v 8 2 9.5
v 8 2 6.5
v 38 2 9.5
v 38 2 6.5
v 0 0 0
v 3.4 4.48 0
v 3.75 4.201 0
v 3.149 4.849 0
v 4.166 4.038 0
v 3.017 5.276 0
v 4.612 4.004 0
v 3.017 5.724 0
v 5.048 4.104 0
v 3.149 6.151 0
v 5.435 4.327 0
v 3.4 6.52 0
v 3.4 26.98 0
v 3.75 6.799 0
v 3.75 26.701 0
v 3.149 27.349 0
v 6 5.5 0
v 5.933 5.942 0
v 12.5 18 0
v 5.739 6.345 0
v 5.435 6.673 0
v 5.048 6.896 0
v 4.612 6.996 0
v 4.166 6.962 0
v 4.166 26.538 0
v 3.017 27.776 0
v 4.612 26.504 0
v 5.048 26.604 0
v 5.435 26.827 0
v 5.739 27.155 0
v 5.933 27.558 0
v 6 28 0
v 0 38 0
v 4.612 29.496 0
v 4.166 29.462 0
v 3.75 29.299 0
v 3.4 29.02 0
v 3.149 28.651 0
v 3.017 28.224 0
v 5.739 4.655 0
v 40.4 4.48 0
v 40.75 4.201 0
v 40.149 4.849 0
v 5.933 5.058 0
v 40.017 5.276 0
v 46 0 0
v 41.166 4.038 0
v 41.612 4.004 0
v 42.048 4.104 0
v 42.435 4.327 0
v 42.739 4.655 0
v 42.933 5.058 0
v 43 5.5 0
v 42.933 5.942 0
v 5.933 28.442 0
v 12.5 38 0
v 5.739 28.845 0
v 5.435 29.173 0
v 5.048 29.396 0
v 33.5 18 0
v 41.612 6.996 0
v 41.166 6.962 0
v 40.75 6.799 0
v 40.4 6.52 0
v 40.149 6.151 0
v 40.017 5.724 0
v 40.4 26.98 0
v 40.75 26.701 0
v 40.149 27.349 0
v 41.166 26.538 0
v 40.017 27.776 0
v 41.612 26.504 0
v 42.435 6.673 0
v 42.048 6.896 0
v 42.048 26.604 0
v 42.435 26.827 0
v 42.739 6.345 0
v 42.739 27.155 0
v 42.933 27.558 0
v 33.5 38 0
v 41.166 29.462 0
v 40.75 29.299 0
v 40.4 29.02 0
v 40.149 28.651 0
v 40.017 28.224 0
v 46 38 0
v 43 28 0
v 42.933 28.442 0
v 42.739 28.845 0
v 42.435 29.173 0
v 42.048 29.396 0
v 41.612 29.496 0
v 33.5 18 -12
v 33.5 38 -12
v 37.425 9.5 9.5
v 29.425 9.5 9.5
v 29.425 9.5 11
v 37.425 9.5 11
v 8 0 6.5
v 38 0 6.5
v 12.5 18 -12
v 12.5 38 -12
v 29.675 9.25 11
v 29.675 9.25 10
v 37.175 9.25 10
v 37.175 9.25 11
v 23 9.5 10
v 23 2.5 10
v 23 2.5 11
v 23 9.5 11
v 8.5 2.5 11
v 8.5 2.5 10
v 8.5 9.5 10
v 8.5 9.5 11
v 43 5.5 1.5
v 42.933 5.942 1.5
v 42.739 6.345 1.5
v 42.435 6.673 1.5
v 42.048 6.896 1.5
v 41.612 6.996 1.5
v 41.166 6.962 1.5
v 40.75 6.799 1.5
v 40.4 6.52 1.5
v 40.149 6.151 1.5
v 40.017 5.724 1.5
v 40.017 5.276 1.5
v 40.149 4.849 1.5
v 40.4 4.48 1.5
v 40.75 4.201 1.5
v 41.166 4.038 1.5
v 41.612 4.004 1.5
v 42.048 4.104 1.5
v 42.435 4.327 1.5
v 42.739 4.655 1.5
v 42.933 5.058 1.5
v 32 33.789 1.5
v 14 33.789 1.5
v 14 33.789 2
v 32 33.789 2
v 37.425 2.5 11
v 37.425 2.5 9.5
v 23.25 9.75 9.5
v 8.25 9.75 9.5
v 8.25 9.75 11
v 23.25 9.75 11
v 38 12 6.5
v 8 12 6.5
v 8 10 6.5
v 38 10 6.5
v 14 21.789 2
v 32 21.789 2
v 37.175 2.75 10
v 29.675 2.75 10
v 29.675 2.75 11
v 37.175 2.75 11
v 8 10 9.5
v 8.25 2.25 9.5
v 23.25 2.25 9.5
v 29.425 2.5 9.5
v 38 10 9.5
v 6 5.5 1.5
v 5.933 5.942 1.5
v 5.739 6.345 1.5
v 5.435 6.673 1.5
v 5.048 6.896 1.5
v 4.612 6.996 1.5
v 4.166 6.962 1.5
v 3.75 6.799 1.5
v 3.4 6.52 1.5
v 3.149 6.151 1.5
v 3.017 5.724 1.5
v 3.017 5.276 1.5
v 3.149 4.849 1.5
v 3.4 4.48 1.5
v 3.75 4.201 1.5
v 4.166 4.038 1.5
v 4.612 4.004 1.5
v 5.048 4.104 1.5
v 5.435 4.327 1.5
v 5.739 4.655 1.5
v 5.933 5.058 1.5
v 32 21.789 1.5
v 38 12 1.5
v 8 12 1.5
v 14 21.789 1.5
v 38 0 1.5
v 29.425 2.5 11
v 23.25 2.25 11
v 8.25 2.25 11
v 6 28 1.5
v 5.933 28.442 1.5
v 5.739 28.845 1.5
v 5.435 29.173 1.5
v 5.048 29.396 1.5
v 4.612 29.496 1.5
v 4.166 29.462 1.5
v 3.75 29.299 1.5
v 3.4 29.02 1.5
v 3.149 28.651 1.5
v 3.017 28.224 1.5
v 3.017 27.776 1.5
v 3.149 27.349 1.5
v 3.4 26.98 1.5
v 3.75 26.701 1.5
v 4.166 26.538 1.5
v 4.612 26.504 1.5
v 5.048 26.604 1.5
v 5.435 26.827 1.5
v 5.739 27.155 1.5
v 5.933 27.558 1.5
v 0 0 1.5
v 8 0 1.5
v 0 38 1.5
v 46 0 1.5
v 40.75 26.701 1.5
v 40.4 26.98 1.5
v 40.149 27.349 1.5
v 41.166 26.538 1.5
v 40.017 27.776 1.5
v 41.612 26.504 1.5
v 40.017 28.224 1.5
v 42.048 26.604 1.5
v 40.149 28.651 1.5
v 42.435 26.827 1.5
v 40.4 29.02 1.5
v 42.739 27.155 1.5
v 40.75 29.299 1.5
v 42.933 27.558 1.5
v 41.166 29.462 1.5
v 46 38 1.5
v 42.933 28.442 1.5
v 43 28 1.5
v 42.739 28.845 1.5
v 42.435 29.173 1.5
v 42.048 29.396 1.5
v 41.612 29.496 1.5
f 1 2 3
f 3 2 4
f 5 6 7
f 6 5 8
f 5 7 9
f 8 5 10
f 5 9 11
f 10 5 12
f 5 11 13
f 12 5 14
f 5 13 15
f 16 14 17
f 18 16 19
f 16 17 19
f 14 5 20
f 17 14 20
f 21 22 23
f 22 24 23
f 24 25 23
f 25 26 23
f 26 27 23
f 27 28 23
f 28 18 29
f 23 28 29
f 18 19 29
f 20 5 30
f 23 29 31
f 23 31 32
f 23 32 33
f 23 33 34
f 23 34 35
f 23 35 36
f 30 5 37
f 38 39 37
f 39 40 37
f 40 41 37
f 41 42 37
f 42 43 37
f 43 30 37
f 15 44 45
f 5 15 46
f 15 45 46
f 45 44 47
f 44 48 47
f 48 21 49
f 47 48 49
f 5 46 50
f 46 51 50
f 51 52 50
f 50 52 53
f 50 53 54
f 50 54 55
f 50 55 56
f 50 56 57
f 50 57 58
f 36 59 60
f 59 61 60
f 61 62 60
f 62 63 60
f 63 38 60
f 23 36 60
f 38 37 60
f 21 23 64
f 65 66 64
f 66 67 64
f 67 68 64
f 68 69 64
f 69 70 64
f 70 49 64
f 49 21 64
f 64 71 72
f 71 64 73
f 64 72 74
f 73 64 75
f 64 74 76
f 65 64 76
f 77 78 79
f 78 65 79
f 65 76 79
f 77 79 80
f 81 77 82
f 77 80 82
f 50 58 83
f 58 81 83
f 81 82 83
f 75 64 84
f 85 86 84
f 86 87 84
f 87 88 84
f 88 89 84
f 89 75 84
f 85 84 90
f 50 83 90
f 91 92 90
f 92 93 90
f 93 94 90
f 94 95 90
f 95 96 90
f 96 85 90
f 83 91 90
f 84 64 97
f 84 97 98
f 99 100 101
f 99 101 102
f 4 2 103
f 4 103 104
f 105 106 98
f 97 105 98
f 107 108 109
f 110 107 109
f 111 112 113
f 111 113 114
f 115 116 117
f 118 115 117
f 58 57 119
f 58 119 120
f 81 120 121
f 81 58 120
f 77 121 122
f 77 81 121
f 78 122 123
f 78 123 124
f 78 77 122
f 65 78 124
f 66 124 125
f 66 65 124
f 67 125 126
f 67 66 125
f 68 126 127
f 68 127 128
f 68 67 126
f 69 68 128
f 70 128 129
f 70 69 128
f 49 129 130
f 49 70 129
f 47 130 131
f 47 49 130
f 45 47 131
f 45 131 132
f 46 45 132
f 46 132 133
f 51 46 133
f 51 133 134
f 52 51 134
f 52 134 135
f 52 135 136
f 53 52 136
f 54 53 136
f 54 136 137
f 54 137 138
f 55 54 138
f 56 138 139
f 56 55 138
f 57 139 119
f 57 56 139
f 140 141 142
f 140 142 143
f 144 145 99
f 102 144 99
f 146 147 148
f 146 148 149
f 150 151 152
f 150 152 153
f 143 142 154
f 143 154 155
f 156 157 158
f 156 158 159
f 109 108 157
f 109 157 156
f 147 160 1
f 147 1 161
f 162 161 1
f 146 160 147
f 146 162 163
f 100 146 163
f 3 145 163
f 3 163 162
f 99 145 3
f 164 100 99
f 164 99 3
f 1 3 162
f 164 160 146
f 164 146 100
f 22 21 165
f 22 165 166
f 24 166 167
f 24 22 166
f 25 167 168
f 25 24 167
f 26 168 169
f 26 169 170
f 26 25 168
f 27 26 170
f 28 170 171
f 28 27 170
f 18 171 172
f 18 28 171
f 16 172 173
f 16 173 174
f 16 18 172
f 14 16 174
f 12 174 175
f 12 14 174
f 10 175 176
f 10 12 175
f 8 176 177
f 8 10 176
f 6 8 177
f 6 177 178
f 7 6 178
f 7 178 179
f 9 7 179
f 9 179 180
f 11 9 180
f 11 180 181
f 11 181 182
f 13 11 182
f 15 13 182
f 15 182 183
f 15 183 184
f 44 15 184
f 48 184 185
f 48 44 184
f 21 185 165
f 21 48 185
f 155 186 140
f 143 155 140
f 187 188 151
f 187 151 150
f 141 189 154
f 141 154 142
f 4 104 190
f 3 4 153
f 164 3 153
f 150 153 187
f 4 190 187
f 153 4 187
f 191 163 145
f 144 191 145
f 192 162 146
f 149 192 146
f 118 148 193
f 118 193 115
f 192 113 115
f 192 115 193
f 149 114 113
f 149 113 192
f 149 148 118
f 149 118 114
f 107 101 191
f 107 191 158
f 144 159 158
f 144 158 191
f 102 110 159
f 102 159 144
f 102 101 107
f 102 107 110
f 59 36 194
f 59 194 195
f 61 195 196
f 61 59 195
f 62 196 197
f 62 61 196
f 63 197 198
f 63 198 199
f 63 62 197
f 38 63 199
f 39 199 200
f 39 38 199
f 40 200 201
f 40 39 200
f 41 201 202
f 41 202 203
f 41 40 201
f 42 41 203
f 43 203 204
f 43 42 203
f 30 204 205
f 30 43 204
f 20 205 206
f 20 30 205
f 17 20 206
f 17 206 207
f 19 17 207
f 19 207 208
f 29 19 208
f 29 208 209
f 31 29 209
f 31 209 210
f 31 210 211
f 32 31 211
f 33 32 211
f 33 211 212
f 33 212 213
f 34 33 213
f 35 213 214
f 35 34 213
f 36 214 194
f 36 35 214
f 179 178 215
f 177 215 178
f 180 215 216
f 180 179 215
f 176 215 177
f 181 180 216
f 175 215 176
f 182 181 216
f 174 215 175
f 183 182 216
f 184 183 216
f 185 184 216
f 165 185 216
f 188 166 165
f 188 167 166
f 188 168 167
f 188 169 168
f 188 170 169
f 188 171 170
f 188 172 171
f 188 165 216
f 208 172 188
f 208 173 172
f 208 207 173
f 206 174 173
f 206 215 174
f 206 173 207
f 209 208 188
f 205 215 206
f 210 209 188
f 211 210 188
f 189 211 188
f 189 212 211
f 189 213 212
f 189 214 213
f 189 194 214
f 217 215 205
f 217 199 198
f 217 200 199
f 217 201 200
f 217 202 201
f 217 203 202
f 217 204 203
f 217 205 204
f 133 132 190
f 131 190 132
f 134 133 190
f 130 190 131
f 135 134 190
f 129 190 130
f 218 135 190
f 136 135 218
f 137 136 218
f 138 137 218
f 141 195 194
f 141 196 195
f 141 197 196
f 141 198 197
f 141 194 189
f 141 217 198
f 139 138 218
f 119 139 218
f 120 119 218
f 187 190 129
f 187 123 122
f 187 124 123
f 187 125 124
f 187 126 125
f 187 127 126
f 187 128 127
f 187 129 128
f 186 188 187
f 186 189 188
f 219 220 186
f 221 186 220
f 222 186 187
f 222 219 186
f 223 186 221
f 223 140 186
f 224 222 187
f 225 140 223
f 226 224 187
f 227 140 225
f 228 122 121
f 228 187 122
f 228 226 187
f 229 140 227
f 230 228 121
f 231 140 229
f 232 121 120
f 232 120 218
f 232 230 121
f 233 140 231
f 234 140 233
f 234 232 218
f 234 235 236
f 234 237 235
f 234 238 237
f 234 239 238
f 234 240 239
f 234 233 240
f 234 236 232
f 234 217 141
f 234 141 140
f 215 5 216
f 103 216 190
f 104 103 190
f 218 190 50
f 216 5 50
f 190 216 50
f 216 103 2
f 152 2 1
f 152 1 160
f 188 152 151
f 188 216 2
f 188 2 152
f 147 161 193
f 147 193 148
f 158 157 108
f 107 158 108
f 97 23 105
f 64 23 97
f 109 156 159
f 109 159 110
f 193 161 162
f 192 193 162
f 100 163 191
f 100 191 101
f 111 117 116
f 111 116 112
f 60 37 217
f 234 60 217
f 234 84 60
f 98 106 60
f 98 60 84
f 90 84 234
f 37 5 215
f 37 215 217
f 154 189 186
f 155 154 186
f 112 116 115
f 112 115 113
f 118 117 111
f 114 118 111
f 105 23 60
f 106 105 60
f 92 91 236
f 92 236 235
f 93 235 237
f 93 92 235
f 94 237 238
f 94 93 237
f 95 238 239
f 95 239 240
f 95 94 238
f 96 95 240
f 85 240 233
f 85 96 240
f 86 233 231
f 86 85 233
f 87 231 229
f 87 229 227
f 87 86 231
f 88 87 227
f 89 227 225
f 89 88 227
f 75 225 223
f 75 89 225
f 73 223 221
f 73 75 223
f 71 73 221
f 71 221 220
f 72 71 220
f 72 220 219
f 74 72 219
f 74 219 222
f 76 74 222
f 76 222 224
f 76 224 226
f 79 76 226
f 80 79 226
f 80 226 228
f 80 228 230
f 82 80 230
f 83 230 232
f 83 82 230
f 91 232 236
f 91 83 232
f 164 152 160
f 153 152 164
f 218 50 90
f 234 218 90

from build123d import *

# Parameters (mm, degrees)
SKETCH2_W           = 46
SKETCH2_H           = 38
SKETCH2_R           = 1.5
BOSS_EXTRUDE1_DEPTH = 1.5
SKETCH3_W           = 30
SKETCH3_H           = 12
BOSS_EXTRUDE2_DEPTH = 6.5
SKETCH4_W           = 30
SKETCH4_H           = 8
BOSS_EXTRUDE3_DEPTH = 9.5
SKETCH5_W           = 15
SKETCH5_H           = 7.5
BOSS_EXTRUDE4_DEPTH = 11
SKETCH6_W           = 14.5
SKETCH6_H           = 7
CUT_EXTRUDE1_DEPTH  = 11
SKETCH9_W           = 8
SKETCH9_H           = 7
BOSS_EXTRUDE5_DEPTH = 11
SKETCH10_W          = 7.5
SKETCH10_H          = 6.5
CUT_EXTRUDE2_DEPTH  = 11
SKETCH12_W          = 21
SKETCH12_H          = 20
BOSS_EXTRUDE6_DEPTH = 12
SKETCH13_W          = 18
SKETCH13_H          = 12
BOSS_EXTRUDE7_DEPTH = 2


with BuildPart() as part:
    # Sketch2 → Boss-Extrude1 (new body)
    with BuildSketch(Plane.XY):
        with Locations((23, 19)):
            Rectangle(SKETCH2_W, SKETCH2_H)
        with Locations((4.5, 28)):
            Circle(SKETCH2_R, mode=Mode.SUBTRACT)
        with Locations((4.5, 5.5)):
            Circle(SKETCH2_R, mode=Mode.SUBTRACT)
        with Locations((41.5, 5.5)):
            Circle(SKETCH2_R, mode=Mode.SUBTRACT)
        with Locations((41.5, 28)):
            Circle(SKETCH2_R, mode=Mode.SUBTRACT)
    extrude(amount=BOSS_EXTRUDE1_DEPTH)

    # Sketch3 → Boss-Extrude2 (add)
    with BuildSketch(Plane.XY):
        with Locations((23, 6)):
            Rectangle(SKETCH3_W, SKETCH3_H)
    extrude(amount=BOSS_EXTRUDE2_DEPTH)

    # Sketch4 → Boss-Extrude3 (add)
    with BuildSketch(Plane.XY):
        with Locations((23, 6)):
            Rectangle(SKETCH4_W, SKETCH4_H)
    extrude(amount=BOSS_EXTRUDE3_DEPTH)

    # Sketch5 → Boss-Extrude4 (add)
    with BuildSketch(Plane.XY):
        with Locations((15.75, 6)):
            Rectangle(SKETCH5_W, SKETCH5_H)
    extrude(amount=BOSS_EXTRUDE4_DEPTH)

    # Sketch6 → Cut-Extrude1 (cut)
    with BuildSketch(Plane.XY.offset(10)):
        with Locations((15.75, 6)):
            Rectangle(SKETCH6_W, SKETCH6_H)
    extrude(amount=CUT_EXTRUDE1_DEPTH, mode=Mode.SUBTRACT)

    # Sketch9 → Boss-Extrude5 (add)
    with BuildSketch(Plane.XY):
        with Locations((33.424570799, 6)):
            Rectangle(SKETCH9_W, SKETCH9_H)
    extrude(amount=BOSS_EXTRUDE5_DEPTH)

    # Sketch10 → Cut-Extrude2 (cut)
    with BuildSketch(Plane.XY.offset(10)):
        with Locations((33.424570799, 6)):
            Rectangle(SKETCH10_W, SKETCH10_H)
    extrude(amount=CUT_EXTRUDE2_DEPTH, mode=Mode.SUBTRACT)

    # Sketch12 → Boss-Extrude6 (add)
    with BuildSketch(Plane.XY):
        with Locations((23, 28)):
            Rectangle(SKETCH12_W, SKETCH12_H)
    extrude(amount=-BOSS_EXTRUDE6_DEPTH)

    # Sketch13 → Boss-Extrude7 (add)
    with BuildSketch(Plane.XY):
        with Locations((23, 27.789125994)):
            Rectangle(SKETCH13_W, SKETCH13_H)
    extrude(amount=BOSS_EXTRUDE7_DEPTH)


solid = part.part
